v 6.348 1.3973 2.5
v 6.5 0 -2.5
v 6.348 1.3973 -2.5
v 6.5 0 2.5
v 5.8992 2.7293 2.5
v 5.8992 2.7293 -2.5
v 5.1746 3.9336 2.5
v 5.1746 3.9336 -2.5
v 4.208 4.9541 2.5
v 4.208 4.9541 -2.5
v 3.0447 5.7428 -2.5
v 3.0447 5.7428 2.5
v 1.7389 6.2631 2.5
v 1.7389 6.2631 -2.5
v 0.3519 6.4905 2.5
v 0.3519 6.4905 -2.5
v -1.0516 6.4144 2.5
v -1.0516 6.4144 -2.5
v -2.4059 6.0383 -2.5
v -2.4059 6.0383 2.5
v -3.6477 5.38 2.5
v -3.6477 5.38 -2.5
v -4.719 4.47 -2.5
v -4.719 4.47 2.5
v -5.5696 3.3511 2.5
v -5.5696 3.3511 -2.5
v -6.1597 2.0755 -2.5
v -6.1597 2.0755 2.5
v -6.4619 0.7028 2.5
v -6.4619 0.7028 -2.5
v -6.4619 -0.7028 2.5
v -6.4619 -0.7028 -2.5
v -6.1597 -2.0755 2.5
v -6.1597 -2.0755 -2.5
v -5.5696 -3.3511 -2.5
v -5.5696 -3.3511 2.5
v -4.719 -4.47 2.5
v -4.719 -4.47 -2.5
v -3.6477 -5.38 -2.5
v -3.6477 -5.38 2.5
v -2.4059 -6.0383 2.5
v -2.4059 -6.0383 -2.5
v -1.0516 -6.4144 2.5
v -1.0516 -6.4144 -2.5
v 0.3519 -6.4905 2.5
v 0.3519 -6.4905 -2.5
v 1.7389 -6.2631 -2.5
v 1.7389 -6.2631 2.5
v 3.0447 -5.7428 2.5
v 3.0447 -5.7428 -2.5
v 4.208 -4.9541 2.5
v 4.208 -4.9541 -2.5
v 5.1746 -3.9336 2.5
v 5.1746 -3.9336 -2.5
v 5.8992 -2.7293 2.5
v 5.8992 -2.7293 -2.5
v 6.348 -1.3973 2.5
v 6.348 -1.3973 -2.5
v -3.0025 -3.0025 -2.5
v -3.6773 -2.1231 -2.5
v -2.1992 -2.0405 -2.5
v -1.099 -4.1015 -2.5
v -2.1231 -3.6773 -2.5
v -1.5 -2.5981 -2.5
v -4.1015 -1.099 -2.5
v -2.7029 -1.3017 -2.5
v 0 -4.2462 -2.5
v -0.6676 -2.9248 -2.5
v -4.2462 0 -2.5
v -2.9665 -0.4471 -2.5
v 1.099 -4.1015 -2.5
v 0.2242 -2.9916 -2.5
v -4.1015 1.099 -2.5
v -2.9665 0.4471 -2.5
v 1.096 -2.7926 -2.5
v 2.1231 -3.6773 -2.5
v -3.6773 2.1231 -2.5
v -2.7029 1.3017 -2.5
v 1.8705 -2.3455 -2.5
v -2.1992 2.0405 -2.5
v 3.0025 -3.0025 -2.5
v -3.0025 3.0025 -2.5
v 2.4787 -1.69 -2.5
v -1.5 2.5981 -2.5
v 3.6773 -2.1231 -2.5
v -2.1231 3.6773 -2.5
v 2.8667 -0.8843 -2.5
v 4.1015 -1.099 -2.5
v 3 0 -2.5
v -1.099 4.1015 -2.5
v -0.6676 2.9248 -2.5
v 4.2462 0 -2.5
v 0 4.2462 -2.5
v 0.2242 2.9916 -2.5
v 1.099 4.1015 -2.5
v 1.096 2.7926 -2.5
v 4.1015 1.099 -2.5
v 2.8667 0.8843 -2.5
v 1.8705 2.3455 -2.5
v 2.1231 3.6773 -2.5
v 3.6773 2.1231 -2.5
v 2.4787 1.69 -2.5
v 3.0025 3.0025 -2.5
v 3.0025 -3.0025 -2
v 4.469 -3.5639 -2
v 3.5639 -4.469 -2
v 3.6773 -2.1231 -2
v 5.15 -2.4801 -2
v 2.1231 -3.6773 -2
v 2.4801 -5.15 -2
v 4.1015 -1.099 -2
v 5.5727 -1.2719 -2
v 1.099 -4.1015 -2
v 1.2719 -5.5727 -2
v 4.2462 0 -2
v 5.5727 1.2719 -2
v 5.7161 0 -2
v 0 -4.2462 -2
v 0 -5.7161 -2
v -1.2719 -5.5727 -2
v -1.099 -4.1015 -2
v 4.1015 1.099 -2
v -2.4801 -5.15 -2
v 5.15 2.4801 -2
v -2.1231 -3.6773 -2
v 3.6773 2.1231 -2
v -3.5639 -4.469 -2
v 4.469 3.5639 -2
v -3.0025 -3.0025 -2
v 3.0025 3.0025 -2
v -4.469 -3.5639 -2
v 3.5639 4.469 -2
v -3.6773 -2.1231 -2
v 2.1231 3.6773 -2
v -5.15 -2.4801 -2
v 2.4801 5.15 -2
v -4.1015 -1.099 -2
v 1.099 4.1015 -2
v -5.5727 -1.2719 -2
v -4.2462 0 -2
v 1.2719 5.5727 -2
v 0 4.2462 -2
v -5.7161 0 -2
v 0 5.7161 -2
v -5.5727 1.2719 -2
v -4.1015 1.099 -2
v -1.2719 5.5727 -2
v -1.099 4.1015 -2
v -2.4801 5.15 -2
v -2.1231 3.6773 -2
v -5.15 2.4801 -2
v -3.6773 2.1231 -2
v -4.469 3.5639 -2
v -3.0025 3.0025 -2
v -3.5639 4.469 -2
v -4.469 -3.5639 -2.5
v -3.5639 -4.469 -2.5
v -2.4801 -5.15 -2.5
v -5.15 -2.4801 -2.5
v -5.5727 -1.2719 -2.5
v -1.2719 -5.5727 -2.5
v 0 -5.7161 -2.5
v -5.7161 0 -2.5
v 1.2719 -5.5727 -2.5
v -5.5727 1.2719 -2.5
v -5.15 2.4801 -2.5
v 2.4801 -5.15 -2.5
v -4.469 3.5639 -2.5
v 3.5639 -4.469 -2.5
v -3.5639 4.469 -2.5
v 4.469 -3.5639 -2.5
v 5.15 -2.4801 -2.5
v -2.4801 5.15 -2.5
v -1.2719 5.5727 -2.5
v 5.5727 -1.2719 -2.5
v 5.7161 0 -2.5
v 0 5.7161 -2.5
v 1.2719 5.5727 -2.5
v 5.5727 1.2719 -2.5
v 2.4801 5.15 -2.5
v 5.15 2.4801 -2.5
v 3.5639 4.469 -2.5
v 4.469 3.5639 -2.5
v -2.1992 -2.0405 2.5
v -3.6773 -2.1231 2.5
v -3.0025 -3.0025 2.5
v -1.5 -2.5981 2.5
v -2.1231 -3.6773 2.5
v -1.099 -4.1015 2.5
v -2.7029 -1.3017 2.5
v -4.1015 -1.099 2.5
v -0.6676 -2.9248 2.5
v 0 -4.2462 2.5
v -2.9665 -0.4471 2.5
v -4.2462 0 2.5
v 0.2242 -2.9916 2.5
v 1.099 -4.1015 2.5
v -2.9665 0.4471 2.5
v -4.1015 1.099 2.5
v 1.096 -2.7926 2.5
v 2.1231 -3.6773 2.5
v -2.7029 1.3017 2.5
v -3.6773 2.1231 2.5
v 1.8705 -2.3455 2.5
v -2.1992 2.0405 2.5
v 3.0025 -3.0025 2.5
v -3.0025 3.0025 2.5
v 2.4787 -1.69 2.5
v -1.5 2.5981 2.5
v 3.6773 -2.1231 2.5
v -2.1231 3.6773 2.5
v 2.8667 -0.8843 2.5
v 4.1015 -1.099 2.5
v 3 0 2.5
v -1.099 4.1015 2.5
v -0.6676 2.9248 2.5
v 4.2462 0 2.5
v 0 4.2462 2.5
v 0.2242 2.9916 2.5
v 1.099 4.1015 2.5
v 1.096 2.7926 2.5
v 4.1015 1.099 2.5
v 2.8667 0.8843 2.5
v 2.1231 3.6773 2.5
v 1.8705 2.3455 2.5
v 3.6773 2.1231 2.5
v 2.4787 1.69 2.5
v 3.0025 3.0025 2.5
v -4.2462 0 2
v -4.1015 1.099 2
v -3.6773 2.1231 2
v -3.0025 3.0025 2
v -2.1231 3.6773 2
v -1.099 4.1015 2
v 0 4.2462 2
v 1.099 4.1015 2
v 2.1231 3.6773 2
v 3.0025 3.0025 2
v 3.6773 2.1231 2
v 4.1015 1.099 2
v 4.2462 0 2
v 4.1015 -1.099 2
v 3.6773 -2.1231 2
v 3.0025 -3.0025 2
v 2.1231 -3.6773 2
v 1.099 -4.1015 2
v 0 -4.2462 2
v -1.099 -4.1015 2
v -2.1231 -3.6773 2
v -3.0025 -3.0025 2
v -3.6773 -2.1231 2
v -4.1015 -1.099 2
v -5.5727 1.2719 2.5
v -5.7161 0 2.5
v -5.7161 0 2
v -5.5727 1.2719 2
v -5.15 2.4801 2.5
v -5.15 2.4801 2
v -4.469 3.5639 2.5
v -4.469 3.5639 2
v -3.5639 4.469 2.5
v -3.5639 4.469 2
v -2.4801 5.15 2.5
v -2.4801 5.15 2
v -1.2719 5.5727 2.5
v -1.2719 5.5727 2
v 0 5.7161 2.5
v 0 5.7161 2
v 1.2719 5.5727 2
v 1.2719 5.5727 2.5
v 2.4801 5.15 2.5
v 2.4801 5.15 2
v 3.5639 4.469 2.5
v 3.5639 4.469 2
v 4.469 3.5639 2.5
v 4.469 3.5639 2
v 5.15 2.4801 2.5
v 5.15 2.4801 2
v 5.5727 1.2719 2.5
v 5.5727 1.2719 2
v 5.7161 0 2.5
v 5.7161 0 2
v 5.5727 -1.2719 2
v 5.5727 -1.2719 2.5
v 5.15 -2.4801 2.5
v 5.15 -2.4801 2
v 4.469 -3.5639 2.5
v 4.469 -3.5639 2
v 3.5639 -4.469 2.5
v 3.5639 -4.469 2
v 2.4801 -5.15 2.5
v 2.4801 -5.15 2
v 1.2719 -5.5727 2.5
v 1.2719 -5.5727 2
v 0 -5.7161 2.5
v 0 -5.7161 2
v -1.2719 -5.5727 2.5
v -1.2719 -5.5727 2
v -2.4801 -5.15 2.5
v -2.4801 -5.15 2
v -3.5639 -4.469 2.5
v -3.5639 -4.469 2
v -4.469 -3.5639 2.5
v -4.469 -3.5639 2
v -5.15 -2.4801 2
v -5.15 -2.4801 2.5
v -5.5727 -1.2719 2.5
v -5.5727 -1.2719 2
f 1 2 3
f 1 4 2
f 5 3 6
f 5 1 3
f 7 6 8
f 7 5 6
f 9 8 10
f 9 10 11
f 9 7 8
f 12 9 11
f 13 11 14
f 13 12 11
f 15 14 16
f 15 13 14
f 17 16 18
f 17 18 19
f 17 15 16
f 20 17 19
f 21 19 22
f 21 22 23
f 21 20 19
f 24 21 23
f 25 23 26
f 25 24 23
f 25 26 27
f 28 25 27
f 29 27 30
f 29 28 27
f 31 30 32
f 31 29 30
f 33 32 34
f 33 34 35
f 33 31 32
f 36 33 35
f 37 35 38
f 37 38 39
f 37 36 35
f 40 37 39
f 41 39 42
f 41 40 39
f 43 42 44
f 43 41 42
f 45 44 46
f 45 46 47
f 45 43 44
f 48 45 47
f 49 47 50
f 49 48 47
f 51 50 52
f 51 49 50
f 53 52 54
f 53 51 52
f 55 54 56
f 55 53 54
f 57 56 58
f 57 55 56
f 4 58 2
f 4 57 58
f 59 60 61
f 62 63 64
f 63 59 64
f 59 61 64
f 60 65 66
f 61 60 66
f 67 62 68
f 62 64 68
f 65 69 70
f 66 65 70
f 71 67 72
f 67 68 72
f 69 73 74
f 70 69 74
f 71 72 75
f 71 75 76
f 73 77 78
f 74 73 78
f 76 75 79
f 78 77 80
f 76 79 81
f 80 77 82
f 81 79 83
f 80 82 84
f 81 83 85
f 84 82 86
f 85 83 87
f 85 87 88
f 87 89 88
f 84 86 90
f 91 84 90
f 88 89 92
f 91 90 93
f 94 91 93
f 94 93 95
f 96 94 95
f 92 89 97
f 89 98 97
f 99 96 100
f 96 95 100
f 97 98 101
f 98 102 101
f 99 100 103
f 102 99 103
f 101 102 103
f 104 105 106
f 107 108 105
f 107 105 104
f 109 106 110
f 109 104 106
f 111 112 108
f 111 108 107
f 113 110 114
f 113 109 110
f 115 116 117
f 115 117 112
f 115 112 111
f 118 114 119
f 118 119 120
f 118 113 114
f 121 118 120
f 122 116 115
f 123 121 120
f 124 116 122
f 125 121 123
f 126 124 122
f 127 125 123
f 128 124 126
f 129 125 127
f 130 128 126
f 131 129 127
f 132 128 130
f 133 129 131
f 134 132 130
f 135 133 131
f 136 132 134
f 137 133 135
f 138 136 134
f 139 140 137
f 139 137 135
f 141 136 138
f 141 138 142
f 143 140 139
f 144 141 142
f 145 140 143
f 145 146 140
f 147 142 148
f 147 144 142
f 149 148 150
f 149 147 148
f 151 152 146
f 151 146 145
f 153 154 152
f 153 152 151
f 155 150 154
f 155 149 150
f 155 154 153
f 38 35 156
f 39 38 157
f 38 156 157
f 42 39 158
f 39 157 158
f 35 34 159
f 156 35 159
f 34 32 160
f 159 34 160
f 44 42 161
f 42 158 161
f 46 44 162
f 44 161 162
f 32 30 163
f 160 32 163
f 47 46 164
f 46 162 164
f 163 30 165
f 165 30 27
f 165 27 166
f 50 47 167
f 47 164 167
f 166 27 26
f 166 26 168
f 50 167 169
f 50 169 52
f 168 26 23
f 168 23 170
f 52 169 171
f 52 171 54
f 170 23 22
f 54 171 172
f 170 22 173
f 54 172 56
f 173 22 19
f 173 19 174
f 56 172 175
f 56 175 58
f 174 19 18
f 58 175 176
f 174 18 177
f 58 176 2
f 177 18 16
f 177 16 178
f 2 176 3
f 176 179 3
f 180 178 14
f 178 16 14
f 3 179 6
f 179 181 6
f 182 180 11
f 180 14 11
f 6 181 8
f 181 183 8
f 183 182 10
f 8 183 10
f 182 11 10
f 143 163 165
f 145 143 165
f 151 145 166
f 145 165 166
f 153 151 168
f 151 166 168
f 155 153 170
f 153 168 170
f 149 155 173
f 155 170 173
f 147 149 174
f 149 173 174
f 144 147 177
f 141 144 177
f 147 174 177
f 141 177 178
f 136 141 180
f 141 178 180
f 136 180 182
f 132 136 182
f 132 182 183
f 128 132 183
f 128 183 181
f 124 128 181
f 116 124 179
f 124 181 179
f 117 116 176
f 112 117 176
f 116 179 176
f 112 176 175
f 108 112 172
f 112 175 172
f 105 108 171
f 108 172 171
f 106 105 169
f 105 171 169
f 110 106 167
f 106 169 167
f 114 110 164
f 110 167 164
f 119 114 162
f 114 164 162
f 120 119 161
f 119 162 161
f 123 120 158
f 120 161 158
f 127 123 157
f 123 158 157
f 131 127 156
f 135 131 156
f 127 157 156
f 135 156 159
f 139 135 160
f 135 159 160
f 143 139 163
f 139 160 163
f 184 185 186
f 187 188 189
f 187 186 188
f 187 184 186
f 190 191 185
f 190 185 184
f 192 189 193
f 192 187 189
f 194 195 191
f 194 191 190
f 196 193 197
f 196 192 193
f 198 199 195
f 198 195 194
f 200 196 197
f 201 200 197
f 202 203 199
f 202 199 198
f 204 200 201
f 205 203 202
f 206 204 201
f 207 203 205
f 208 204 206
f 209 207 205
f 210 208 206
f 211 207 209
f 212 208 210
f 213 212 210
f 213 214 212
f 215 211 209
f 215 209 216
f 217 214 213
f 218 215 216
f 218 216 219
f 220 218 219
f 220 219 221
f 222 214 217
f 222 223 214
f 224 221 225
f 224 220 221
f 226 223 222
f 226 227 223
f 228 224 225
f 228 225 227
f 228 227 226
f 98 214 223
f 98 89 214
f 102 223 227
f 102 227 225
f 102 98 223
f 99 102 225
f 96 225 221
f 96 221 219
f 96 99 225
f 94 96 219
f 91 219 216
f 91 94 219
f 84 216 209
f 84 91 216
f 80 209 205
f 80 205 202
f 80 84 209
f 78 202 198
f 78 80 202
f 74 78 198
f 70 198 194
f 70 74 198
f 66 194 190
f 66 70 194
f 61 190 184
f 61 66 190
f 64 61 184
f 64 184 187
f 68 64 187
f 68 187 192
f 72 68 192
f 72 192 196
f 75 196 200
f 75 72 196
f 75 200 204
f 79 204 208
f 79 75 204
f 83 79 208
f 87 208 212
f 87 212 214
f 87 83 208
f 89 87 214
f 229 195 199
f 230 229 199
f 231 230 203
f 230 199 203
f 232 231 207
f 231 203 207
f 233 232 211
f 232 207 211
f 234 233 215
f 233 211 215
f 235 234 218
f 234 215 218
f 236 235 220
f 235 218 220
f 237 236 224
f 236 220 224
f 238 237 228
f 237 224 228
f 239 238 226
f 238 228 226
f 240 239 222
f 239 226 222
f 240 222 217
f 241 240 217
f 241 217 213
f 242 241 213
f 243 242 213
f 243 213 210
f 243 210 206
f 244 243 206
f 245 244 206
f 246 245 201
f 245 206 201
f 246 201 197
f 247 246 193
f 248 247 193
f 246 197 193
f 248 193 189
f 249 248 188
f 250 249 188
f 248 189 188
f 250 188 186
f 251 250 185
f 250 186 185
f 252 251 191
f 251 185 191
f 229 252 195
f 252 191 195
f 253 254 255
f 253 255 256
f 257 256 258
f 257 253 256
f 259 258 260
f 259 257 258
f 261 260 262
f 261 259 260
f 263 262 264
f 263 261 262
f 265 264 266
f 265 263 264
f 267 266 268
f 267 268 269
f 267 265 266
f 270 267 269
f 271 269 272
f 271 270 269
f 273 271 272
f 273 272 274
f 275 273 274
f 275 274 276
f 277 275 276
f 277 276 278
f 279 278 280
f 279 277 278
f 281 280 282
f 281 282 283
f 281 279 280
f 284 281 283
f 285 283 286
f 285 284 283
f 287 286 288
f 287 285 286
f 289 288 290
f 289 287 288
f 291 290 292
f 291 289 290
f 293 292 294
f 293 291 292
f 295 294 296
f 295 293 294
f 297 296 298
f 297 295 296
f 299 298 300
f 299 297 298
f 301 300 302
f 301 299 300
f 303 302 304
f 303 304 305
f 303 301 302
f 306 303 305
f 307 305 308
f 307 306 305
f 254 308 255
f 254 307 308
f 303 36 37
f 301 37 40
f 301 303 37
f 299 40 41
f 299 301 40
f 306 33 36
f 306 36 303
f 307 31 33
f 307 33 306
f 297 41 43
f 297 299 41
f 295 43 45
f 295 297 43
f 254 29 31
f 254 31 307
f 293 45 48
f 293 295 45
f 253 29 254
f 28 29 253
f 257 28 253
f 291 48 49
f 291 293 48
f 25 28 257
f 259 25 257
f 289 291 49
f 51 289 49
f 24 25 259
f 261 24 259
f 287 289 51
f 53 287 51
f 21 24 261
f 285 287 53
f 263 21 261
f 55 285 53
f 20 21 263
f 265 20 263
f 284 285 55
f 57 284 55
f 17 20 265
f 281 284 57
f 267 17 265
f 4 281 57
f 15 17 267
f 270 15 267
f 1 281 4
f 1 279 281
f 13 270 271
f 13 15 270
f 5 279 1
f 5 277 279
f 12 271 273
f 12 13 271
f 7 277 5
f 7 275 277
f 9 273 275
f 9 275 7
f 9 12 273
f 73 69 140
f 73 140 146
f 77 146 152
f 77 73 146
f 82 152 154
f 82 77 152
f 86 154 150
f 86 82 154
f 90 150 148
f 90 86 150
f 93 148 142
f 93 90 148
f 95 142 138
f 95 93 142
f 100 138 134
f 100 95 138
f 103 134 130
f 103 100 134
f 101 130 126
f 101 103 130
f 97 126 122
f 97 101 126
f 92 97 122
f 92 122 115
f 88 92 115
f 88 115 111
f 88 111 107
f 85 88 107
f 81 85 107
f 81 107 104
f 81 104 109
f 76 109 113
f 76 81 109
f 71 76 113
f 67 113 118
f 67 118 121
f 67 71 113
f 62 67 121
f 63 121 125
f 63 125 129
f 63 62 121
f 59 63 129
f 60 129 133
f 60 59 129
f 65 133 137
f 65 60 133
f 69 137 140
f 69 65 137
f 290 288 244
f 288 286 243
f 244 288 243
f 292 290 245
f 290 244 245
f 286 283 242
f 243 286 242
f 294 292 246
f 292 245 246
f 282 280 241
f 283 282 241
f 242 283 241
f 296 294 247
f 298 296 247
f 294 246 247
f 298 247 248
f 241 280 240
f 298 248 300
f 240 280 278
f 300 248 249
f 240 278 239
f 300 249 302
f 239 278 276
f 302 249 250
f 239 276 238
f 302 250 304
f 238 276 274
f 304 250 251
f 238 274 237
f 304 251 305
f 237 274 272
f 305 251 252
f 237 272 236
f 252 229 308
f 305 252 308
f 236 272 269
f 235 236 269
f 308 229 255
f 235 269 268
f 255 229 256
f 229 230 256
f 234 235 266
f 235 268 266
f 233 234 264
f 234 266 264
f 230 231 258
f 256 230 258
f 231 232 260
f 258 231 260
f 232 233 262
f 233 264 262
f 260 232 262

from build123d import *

# Parameters (mm, degrees)
SKETCH_1_R          = 6.5
SKETCH_1_R_2        = 3
EXTRUDE_1_DEPTH     = 2.5
SKETCH_2_R          = 5.716050362
SKETCH_2_R_2        = 4.24621305
CUT_EXTRUDE_1_DEPTH = 0.5


with BuildPart() as part:
    # 草图1 → 凸台-拉伸1 (new, symmetric)
    with BuildSketch(Plane.XY):
        Circle(SKETCH_1_R)
        Circle(SKETCH_1_R_2, mode=Mode.SUBTRACT)
    extrude(amount=EXTRUDE_1_DEPTH, both=True)

    # 草图2 → 切除-拉伸1 (cut)
    with BuildSketch(Plane(origin=(0, 0, -2.5), x_dir=(-1, 0, 0), z_dir=(0, 0, -1))):
        Circle(SKETCH_2_R)
        Circle(SKETCH_2_R_2, mode=Mode.SUBTRACT)
    cut_extrude_1 = extrude(amount=-CUT_EXTRUDE_1_DEPTH, mode=Mode.SUBTRACT)

    # 镜向1: 切除-拉伸1 across plane
    add(cut_extrude_1.mirror(Plane.XY), mode=Mode.SUBTRACT)


solid = part.part
